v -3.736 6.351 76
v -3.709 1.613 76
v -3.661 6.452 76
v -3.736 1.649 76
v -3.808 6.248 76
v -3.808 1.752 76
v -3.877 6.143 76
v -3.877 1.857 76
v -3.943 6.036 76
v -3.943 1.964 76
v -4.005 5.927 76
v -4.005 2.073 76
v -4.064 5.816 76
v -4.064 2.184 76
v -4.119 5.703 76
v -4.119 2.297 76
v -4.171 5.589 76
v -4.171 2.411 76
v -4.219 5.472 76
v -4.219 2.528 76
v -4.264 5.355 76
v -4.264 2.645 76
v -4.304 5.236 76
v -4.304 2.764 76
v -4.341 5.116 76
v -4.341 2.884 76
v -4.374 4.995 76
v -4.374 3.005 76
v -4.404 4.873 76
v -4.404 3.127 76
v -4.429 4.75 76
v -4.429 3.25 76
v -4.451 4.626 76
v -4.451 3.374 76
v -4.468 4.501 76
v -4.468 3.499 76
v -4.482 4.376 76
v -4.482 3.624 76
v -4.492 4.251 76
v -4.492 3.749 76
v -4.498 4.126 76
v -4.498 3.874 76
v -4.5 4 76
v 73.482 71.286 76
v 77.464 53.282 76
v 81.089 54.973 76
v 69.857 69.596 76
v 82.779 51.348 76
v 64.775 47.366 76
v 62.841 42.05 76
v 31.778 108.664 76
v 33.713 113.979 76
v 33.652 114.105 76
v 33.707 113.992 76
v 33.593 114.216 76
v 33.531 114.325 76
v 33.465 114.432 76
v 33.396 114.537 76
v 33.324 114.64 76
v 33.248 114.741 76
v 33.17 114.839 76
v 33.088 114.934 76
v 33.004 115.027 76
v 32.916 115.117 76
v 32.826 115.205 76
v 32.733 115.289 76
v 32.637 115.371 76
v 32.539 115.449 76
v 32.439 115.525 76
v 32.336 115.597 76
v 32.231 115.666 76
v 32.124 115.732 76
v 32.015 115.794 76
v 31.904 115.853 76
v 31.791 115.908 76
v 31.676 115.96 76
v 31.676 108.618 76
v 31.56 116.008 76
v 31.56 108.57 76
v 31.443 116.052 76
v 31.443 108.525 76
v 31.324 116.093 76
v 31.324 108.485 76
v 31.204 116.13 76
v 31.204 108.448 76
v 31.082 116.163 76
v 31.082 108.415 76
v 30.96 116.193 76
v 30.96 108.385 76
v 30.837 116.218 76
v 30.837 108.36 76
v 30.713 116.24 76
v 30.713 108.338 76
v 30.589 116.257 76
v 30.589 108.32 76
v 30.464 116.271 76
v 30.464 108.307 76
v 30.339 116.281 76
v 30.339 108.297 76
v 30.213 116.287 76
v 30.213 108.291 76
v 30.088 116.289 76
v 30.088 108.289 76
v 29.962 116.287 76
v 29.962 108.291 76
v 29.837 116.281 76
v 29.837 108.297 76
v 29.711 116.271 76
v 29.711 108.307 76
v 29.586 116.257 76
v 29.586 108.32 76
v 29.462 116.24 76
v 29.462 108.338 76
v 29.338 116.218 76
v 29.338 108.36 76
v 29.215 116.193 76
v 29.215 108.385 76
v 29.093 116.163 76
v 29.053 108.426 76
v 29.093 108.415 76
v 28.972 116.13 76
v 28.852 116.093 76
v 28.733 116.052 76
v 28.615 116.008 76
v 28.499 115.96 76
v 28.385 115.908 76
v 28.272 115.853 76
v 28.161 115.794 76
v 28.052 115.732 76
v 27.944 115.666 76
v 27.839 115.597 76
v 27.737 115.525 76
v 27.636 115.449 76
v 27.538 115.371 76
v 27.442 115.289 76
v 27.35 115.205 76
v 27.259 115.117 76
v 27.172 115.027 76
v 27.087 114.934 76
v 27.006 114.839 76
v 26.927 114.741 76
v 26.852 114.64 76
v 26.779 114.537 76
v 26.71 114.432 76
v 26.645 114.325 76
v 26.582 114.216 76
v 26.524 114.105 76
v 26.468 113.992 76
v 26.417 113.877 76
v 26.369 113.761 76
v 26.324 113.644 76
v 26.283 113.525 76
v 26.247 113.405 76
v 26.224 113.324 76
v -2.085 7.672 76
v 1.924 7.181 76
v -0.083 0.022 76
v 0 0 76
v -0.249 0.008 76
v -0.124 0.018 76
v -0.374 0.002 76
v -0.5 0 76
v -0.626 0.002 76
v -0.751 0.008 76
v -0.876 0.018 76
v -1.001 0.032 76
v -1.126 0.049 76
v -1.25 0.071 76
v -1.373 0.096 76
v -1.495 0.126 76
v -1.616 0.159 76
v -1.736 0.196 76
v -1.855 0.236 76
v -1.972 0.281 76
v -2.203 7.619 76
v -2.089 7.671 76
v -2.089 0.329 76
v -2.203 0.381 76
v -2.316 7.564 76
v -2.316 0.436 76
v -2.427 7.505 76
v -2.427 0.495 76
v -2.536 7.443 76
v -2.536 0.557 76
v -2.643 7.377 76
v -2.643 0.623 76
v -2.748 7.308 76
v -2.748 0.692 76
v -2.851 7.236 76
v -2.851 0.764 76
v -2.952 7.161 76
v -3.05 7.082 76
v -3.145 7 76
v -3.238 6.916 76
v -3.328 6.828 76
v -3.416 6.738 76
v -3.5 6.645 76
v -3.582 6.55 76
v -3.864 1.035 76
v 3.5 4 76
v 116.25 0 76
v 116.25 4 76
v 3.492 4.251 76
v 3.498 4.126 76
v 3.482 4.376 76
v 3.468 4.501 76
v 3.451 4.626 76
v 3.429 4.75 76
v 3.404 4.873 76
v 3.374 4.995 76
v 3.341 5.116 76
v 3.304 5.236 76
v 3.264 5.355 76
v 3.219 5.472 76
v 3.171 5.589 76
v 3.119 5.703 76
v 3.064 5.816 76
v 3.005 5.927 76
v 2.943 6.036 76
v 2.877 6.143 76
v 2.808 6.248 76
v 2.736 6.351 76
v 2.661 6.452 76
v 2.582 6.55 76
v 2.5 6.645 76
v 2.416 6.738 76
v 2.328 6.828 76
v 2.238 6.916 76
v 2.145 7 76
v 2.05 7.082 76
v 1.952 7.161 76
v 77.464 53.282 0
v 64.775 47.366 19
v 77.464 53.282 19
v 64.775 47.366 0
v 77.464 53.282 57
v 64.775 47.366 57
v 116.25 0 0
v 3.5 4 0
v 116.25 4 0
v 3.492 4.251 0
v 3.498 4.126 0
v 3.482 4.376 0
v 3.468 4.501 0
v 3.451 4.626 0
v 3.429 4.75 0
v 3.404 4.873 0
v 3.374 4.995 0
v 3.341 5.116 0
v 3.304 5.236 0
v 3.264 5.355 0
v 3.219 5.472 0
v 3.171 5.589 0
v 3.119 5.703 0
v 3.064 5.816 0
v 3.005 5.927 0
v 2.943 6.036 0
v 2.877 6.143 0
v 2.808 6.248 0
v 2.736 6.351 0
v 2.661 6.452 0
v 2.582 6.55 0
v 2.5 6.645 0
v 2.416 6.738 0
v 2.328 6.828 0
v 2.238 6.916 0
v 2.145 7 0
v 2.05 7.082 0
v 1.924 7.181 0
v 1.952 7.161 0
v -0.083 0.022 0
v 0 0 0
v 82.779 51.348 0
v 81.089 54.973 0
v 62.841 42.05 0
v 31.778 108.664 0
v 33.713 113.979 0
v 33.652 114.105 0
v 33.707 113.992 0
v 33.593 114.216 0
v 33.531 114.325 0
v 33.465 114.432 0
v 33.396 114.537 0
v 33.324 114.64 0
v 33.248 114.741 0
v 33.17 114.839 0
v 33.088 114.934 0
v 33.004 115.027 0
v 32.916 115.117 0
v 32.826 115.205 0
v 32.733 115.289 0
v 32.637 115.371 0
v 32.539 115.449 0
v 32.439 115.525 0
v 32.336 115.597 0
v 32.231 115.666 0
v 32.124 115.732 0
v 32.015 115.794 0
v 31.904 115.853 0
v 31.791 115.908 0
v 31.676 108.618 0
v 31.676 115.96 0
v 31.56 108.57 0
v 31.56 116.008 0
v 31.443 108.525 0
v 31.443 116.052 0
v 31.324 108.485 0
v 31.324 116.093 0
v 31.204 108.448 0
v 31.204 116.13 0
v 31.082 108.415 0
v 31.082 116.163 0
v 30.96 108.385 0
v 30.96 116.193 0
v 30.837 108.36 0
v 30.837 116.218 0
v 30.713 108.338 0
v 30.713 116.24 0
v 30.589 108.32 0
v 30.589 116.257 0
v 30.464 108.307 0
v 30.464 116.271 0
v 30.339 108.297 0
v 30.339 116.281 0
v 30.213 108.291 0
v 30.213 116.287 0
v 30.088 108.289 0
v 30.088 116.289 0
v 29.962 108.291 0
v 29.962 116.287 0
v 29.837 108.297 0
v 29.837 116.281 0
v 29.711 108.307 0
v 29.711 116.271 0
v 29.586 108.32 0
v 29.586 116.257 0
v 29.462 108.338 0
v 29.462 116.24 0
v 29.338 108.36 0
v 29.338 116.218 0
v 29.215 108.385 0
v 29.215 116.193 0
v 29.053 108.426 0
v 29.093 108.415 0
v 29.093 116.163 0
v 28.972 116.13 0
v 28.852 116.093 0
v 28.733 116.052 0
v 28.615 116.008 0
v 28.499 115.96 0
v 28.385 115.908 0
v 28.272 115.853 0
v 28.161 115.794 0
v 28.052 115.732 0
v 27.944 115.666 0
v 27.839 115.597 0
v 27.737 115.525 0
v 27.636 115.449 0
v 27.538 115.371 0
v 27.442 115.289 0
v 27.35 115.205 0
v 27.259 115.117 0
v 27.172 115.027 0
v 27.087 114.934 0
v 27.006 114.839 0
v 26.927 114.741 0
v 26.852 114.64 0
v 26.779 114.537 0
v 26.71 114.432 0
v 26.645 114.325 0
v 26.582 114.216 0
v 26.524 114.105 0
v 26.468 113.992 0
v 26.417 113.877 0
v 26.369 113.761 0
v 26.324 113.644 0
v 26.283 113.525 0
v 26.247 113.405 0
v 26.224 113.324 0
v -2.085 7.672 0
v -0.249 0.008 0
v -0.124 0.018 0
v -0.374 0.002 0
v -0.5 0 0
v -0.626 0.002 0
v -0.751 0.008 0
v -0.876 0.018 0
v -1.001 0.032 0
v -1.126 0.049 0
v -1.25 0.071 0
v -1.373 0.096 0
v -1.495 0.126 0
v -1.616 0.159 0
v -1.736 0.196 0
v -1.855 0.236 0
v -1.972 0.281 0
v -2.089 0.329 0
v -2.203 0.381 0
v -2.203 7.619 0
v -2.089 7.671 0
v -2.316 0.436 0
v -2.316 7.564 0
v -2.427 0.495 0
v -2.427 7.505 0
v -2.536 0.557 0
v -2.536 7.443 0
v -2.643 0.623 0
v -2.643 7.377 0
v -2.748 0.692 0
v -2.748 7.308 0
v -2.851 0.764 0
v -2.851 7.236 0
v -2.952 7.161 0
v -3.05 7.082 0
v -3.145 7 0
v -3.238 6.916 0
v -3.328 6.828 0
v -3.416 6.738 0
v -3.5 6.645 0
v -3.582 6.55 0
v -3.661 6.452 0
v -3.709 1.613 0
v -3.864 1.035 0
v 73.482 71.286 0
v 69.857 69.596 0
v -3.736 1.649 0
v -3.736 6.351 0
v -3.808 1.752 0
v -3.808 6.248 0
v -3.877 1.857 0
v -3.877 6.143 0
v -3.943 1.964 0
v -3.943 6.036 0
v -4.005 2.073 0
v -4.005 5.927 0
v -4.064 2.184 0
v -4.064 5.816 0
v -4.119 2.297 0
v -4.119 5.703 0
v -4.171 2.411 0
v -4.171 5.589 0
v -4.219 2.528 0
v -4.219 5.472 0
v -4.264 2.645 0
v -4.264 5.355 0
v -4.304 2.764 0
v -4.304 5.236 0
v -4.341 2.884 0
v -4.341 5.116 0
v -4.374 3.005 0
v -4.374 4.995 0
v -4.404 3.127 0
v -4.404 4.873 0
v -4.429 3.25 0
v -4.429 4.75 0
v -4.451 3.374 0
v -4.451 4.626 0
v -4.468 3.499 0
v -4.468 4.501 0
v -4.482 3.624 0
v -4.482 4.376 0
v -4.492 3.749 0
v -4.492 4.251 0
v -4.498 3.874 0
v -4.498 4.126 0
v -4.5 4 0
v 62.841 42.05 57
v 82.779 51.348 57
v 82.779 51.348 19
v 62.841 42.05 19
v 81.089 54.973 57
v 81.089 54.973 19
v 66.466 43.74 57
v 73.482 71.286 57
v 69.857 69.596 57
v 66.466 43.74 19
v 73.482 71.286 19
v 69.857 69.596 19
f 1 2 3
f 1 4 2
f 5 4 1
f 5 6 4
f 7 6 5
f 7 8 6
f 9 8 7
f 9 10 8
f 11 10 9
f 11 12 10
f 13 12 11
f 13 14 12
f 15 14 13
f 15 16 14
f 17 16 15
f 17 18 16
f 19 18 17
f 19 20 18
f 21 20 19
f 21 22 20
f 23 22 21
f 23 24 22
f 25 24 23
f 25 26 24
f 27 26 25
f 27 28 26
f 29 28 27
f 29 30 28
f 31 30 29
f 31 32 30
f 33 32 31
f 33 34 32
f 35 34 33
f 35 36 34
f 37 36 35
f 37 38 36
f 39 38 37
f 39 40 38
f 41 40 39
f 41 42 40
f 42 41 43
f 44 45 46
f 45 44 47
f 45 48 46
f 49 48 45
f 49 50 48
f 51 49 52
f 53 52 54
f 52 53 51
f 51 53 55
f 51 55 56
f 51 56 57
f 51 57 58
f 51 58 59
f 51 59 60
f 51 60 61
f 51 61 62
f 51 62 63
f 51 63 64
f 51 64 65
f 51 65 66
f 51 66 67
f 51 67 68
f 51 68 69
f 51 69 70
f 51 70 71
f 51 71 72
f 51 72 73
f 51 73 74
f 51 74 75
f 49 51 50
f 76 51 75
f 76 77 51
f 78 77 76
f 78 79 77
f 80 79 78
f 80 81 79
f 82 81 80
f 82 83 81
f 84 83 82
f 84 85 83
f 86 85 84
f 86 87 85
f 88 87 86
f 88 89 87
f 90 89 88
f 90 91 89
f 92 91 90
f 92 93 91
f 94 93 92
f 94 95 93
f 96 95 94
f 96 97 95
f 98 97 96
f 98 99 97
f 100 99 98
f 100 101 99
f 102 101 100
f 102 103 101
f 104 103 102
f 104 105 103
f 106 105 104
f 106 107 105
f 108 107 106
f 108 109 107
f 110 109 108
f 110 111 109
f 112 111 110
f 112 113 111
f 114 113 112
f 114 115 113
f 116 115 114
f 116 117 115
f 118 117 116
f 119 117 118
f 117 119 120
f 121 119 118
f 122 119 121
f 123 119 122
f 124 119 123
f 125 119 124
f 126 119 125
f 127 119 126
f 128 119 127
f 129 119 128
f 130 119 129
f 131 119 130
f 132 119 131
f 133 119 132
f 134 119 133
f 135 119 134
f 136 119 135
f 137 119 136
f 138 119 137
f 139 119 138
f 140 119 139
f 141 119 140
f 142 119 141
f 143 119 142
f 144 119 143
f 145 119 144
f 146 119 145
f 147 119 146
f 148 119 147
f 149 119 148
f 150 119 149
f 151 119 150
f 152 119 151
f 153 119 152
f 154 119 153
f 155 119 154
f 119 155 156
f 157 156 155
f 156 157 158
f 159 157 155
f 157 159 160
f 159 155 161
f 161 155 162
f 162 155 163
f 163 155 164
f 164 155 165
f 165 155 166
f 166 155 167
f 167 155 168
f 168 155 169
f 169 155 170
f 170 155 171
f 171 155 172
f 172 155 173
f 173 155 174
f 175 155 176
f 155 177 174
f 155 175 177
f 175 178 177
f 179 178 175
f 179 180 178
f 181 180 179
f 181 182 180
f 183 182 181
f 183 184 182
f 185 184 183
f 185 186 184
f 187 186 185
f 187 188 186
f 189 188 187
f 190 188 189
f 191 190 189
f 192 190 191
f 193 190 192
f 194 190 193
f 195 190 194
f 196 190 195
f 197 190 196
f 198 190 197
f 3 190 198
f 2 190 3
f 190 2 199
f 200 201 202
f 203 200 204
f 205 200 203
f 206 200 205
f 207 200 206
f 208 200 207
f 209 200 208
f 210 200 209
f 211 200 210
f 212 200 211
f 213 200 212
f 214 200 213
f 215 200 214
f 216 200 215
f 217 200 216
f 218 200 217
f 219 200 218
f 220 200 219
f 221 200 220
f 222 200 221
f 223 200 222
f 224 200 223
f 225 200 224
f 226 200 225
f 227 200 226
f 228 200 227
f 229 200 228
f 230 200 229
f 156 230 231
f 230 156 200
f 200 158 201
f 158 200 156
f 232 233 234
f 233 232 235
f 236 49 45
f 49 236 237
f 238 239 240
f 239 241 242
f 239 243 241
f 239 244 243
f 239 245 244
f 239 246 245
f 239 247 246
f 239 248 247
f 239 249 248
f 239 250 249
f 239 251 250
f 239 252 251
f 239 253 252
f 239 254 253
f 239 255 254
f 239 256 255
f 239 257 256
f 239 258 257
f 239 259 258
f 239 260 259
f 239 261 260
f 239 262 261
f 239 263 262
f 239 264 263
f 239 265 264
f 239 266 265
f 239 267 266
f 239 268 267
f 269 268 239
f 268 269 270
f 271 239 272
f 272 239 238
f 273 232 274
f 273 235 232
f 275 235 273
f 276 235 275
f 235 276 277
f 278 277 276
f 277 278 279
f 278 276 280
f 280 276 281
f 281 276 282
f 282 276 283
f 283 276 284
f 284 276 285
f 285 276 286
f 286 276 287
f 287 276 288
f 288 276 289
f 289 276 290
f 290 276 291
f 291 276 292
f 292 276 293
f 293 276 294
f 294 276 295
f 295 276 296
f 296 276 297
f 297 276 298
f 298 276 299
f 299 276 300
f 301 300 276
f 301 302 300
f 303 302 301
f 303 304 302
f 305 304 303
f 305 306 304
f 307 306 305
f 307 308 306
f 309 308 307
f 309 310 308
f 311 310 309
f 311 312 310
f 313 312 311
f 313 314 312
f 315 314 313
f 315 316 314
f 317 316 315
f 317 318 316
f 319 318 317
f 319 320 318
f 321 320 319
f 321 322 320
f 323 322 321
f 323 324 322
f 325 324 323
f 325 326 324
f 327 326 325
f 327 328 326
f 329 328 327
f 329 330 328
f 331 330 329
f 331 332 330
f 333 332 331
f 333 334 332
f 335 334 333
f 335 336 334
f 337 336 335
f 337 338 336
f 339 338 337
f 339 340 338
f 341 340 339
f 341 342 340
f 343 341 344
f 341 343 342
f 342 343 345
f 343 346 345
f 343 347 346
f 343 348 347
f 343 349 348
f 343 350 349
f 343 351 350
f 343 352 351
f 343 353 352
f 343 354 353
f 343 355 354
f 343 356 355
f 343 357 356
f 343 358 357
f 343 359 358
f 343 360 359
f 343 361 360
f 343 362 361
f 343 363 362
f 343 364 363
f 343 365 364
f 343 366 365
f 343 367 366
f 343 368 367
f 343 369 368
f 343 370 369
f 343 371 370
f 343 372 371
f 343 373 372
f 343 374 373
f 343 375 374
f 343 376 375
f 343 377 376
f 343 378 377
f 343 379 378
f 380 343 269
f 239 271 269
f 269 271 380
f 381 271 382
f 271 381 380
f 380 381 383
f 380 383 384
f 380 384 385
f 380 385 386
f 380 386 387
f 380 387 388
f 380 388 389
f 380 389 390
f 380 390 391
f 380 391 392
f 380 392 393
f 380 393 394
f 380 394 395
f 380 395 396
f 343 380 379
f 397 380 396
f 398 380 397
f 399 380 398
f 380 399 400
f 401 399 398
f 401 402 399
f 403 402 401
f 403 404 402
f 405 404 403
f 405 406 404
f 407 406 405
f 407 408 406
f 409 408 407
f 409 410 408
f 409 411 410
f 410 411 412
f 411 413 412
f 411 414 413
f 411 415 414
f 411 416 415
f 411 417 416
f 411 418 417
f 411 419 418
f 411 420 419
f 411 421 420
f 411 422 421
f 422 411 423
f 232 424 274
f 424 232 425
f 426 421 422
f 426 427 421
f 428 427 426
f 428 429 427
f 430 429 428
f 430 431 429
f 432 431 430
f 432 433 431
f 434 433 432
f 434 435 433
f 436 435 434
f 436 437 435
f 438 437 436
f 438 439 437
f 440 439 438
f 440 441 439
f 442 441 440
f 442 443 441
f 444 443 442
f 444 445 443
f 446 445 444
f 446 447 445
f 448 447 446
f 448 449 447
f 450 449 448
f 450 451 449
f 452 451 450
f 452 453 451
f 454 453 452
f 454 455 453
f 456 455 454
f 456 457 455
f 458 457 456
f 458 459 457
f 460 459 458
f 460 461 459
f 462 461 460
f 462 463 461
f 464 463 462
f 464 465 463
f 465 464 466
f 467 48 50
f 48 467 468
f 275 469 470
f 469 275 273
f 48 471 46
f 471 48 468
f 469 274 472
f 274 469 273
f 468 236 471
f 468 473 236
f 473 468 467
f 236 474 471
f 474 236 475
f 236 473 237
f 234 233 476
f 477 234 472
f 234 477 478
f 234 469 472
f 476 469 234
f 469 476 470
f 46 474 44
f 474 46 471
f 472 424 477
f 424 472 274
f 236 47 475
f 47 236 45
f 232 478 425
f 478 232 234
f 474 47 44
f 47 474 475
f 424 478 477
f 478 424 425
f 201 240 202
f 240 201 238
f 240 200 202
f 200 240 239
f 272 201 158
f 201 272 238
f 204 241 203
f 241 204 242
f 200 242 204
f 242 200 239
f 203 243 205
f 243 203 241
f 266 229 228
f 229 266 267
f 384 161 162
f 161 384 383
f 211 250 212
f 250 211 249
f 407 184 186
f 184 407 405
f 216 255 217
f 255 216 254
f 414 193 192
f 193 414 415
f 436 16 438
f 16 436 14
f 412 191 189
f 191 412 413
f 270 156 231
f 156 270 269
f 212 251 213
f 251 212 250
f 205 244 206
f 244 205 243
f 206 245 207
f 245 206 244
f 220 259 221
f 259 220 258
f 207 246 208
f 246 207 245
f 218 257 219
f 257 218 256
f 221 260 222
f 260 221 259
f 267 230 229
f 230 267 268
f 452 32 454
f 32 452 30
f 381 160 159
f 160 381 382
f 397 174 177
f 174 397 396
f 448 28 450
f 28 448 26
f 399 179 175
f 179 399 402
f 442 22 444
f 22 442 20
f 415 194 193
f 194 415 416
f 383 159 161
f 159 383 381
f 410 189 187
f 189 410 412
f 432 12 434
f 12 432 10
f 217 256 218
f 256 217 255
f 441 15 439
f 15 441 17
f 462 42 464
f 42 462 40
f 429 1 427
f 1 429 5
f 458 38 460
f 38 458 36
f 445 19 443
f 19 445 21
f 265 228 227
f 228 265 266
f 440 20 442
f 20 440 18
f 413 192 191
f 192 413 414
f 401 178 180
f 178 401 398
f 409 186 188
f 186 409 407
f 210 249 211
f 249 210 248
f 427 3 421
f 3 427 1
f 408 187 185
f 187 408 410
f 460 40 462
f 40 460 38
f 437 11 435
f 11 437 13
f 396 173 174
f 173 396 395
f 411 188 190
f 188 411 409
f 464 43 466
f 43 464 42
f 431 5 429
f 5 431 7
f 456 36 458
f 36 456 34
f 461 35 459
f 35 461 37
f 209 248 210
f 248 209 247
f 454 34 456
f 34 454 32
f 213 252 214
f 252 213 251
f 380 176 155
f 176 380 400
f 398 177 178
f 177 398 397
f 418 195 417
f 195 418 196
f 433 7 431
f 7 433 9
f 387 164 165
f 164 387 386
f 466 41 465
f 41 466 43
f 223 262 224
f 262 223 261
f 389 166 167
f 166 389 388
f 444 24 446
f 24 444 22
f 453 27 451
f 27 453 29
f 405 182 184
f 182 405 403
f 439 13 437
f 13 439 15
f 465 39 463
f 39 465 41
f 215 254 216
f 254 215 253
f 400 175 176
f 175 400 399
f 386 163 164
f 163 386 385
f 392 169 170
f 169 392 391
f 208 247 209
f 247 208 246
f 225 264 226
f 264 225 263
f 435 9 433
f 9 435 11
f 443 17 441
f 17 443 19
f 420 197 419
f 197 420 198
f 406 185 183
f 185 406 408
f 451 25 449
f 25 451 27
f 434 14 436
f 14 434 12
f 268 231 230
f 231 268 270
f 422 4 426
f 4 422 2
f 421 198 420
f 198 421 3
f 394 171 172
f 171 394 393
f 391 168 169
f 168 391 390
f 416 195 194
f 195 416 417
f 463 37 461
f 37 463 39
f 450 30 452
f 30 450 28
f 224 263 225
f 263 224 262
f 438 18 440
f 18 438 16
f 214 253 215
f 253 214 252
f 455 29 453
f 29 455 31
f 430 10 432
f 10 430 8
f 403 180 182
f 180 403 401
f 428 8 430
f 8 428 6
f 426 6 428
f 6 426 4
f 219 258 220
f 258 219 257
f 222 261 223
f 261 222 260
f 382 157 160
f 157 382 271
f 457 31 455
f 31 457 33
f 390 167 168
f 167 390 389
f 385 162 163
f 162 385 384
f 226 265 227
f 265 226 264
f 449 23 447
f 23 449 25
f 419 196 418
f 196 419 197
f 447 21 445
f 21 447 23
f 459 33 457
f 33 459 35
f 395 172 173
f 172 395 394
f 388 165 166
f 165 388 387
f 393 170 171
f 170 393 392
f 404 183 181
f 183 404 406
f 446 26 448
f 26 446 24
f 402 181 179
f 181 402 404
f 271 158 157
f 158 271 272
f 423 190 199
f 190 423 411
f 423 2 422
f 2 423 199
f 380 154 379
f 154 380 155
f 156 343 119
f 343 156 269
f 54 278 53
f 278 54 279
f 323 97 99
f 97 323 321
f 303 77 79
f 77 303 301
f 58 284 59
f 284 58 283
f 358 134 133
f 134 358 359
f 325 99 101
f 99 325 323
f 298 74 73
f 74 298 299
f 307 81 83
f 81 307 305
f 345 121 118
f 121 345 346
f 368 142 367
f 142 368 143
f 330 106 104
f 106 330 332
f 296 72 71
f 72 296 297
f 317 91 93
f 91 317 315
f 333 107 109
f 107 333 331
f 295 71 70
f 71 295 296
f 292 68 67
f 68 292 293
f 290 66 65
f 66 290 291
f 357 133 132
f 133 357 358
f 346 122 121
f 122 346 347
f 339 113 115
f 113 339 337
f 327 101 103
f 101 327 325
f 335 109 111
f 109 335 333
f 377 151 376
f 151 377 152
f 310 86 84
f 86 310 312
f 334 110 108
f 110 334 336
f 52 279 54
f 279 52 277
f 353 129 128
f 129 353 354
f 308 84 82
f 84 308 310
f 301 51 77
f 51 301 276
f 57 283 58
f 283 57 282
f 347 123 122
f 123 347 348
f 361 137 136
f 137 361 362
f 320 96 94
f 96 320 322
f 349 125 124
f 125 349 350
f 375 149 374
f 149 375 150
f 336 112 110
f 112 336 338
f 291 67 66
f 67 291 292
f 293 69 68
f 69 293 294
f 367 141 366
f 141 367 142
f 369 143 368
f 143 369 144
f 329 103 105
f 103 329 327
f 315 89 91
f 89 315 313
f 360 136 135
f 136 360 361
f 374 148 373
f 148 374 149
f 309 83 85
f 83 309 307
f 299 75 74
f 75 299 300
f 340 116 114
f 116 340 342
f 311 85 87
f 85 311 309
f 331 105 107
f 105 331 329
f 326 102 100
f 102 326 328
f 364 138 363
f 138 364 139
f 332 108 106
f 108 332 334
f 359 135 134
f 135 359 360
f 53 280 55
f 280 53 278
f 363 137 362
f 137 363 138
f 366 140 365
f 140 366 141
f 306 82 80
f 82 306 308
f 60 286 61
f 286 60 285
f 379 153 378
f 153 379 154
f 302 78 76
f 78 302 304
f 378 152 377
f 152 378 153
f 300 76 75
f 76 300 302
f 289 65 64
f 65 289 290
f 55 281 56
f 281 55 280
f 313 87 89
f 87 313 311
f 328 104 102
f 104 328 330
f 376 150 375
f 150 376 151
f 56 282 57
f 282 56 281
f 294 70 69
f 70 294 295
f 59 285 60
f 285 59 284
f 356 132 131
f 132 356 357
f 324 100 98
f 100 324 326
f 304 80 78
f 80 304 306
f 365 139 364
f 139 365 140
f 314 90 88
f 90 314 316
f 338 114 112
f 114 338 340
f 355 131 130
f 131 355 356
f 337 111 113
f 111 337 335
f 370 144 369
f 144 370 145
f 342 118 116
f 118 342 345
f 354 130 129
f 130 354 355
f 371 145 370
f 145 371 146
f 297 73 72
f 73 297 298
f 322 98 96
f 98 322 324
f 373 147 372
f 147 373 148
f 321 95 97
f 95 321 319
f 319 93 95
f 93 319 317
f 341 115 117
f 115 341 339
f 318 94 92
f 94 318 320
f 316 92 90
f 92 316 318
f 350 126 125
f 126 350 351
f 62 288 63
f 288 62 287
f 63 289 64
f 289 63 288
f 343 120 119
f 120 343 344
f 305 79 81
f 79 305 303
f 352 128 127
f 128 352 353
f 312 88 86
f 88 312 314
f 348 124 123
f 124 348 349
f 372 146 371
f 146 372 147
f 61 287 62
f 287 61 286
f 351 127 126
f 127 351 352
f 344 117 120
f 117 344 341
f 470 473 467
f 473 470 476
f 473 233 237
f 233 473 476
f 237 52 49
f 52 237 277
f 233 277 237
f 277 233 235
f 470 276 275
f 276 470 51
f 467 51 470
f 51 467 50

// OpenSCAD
//Customizable Electronics Stand
//Width of Phone or Tablet
w=80;
//Height of Phone
h=155;
//Thickness of Phone or Tablet
t=20;
//Stand Angle
a=65;

baseHeight=h*0.75;
legHeight=h*0.50;
baseWidth=w*0.95;
module stand()
{
    union(){
        cube([baseHeight,4,baseWidth]);
        translate([-.5,4,0])cylinder(h=baseWidth,r=4,$fn=200);
        rotate([0,0,75])cube([baseHeight,4,baseWidth]);
        translate([cos(75)*baseHeight,sin(75)*baseHeight,0])cylinder(h=baseWidth,r=4,$fn=200);
        translate([cos(75)*baseHeight,sin(75)*baseHeight,0])rotate([0,0,-a])cube([legHeight,4,baseWidth]);
        difference(){
            translate([cos(75)*baseHeight+cos(a)*legHeight,sin(75)*baseHeight-sin(a)*legHeight,0])rotate([0,0,90-a])cube([t+2,4,baseWidth]);
            translate([cos(75)*baseHeight+cos(a)*legHeight,sin(75)*baseHeight-sin(a)*legHeight,0.25*baseWidth])rotate([0,0,90-a])cube([t+2,4,0.5*baseWidth]);
        }
        difference(){
            translate([cos(75)*baseHeight+cos(a)*legHeight+cos(90-a)*(t+2),sin(75)*baseHeight-sin(a)*legHeight+sin(90-a)*(t+2),0])rotate([0,0,180-a])cube([t+2,4,baseWidth]);
            translate([cos(75)*baseHeight+cos(a)*legHeight+cos(90-a)*(t+2),sin(75)*baseHeight-sin(a)*legHeight+sin(90-a)*(t+2),0.25*baseWidth])rotate([0,0,180-a])cube([t+2,4,0.5*baseWidth]);
        }
    }   
        
}
stand();
